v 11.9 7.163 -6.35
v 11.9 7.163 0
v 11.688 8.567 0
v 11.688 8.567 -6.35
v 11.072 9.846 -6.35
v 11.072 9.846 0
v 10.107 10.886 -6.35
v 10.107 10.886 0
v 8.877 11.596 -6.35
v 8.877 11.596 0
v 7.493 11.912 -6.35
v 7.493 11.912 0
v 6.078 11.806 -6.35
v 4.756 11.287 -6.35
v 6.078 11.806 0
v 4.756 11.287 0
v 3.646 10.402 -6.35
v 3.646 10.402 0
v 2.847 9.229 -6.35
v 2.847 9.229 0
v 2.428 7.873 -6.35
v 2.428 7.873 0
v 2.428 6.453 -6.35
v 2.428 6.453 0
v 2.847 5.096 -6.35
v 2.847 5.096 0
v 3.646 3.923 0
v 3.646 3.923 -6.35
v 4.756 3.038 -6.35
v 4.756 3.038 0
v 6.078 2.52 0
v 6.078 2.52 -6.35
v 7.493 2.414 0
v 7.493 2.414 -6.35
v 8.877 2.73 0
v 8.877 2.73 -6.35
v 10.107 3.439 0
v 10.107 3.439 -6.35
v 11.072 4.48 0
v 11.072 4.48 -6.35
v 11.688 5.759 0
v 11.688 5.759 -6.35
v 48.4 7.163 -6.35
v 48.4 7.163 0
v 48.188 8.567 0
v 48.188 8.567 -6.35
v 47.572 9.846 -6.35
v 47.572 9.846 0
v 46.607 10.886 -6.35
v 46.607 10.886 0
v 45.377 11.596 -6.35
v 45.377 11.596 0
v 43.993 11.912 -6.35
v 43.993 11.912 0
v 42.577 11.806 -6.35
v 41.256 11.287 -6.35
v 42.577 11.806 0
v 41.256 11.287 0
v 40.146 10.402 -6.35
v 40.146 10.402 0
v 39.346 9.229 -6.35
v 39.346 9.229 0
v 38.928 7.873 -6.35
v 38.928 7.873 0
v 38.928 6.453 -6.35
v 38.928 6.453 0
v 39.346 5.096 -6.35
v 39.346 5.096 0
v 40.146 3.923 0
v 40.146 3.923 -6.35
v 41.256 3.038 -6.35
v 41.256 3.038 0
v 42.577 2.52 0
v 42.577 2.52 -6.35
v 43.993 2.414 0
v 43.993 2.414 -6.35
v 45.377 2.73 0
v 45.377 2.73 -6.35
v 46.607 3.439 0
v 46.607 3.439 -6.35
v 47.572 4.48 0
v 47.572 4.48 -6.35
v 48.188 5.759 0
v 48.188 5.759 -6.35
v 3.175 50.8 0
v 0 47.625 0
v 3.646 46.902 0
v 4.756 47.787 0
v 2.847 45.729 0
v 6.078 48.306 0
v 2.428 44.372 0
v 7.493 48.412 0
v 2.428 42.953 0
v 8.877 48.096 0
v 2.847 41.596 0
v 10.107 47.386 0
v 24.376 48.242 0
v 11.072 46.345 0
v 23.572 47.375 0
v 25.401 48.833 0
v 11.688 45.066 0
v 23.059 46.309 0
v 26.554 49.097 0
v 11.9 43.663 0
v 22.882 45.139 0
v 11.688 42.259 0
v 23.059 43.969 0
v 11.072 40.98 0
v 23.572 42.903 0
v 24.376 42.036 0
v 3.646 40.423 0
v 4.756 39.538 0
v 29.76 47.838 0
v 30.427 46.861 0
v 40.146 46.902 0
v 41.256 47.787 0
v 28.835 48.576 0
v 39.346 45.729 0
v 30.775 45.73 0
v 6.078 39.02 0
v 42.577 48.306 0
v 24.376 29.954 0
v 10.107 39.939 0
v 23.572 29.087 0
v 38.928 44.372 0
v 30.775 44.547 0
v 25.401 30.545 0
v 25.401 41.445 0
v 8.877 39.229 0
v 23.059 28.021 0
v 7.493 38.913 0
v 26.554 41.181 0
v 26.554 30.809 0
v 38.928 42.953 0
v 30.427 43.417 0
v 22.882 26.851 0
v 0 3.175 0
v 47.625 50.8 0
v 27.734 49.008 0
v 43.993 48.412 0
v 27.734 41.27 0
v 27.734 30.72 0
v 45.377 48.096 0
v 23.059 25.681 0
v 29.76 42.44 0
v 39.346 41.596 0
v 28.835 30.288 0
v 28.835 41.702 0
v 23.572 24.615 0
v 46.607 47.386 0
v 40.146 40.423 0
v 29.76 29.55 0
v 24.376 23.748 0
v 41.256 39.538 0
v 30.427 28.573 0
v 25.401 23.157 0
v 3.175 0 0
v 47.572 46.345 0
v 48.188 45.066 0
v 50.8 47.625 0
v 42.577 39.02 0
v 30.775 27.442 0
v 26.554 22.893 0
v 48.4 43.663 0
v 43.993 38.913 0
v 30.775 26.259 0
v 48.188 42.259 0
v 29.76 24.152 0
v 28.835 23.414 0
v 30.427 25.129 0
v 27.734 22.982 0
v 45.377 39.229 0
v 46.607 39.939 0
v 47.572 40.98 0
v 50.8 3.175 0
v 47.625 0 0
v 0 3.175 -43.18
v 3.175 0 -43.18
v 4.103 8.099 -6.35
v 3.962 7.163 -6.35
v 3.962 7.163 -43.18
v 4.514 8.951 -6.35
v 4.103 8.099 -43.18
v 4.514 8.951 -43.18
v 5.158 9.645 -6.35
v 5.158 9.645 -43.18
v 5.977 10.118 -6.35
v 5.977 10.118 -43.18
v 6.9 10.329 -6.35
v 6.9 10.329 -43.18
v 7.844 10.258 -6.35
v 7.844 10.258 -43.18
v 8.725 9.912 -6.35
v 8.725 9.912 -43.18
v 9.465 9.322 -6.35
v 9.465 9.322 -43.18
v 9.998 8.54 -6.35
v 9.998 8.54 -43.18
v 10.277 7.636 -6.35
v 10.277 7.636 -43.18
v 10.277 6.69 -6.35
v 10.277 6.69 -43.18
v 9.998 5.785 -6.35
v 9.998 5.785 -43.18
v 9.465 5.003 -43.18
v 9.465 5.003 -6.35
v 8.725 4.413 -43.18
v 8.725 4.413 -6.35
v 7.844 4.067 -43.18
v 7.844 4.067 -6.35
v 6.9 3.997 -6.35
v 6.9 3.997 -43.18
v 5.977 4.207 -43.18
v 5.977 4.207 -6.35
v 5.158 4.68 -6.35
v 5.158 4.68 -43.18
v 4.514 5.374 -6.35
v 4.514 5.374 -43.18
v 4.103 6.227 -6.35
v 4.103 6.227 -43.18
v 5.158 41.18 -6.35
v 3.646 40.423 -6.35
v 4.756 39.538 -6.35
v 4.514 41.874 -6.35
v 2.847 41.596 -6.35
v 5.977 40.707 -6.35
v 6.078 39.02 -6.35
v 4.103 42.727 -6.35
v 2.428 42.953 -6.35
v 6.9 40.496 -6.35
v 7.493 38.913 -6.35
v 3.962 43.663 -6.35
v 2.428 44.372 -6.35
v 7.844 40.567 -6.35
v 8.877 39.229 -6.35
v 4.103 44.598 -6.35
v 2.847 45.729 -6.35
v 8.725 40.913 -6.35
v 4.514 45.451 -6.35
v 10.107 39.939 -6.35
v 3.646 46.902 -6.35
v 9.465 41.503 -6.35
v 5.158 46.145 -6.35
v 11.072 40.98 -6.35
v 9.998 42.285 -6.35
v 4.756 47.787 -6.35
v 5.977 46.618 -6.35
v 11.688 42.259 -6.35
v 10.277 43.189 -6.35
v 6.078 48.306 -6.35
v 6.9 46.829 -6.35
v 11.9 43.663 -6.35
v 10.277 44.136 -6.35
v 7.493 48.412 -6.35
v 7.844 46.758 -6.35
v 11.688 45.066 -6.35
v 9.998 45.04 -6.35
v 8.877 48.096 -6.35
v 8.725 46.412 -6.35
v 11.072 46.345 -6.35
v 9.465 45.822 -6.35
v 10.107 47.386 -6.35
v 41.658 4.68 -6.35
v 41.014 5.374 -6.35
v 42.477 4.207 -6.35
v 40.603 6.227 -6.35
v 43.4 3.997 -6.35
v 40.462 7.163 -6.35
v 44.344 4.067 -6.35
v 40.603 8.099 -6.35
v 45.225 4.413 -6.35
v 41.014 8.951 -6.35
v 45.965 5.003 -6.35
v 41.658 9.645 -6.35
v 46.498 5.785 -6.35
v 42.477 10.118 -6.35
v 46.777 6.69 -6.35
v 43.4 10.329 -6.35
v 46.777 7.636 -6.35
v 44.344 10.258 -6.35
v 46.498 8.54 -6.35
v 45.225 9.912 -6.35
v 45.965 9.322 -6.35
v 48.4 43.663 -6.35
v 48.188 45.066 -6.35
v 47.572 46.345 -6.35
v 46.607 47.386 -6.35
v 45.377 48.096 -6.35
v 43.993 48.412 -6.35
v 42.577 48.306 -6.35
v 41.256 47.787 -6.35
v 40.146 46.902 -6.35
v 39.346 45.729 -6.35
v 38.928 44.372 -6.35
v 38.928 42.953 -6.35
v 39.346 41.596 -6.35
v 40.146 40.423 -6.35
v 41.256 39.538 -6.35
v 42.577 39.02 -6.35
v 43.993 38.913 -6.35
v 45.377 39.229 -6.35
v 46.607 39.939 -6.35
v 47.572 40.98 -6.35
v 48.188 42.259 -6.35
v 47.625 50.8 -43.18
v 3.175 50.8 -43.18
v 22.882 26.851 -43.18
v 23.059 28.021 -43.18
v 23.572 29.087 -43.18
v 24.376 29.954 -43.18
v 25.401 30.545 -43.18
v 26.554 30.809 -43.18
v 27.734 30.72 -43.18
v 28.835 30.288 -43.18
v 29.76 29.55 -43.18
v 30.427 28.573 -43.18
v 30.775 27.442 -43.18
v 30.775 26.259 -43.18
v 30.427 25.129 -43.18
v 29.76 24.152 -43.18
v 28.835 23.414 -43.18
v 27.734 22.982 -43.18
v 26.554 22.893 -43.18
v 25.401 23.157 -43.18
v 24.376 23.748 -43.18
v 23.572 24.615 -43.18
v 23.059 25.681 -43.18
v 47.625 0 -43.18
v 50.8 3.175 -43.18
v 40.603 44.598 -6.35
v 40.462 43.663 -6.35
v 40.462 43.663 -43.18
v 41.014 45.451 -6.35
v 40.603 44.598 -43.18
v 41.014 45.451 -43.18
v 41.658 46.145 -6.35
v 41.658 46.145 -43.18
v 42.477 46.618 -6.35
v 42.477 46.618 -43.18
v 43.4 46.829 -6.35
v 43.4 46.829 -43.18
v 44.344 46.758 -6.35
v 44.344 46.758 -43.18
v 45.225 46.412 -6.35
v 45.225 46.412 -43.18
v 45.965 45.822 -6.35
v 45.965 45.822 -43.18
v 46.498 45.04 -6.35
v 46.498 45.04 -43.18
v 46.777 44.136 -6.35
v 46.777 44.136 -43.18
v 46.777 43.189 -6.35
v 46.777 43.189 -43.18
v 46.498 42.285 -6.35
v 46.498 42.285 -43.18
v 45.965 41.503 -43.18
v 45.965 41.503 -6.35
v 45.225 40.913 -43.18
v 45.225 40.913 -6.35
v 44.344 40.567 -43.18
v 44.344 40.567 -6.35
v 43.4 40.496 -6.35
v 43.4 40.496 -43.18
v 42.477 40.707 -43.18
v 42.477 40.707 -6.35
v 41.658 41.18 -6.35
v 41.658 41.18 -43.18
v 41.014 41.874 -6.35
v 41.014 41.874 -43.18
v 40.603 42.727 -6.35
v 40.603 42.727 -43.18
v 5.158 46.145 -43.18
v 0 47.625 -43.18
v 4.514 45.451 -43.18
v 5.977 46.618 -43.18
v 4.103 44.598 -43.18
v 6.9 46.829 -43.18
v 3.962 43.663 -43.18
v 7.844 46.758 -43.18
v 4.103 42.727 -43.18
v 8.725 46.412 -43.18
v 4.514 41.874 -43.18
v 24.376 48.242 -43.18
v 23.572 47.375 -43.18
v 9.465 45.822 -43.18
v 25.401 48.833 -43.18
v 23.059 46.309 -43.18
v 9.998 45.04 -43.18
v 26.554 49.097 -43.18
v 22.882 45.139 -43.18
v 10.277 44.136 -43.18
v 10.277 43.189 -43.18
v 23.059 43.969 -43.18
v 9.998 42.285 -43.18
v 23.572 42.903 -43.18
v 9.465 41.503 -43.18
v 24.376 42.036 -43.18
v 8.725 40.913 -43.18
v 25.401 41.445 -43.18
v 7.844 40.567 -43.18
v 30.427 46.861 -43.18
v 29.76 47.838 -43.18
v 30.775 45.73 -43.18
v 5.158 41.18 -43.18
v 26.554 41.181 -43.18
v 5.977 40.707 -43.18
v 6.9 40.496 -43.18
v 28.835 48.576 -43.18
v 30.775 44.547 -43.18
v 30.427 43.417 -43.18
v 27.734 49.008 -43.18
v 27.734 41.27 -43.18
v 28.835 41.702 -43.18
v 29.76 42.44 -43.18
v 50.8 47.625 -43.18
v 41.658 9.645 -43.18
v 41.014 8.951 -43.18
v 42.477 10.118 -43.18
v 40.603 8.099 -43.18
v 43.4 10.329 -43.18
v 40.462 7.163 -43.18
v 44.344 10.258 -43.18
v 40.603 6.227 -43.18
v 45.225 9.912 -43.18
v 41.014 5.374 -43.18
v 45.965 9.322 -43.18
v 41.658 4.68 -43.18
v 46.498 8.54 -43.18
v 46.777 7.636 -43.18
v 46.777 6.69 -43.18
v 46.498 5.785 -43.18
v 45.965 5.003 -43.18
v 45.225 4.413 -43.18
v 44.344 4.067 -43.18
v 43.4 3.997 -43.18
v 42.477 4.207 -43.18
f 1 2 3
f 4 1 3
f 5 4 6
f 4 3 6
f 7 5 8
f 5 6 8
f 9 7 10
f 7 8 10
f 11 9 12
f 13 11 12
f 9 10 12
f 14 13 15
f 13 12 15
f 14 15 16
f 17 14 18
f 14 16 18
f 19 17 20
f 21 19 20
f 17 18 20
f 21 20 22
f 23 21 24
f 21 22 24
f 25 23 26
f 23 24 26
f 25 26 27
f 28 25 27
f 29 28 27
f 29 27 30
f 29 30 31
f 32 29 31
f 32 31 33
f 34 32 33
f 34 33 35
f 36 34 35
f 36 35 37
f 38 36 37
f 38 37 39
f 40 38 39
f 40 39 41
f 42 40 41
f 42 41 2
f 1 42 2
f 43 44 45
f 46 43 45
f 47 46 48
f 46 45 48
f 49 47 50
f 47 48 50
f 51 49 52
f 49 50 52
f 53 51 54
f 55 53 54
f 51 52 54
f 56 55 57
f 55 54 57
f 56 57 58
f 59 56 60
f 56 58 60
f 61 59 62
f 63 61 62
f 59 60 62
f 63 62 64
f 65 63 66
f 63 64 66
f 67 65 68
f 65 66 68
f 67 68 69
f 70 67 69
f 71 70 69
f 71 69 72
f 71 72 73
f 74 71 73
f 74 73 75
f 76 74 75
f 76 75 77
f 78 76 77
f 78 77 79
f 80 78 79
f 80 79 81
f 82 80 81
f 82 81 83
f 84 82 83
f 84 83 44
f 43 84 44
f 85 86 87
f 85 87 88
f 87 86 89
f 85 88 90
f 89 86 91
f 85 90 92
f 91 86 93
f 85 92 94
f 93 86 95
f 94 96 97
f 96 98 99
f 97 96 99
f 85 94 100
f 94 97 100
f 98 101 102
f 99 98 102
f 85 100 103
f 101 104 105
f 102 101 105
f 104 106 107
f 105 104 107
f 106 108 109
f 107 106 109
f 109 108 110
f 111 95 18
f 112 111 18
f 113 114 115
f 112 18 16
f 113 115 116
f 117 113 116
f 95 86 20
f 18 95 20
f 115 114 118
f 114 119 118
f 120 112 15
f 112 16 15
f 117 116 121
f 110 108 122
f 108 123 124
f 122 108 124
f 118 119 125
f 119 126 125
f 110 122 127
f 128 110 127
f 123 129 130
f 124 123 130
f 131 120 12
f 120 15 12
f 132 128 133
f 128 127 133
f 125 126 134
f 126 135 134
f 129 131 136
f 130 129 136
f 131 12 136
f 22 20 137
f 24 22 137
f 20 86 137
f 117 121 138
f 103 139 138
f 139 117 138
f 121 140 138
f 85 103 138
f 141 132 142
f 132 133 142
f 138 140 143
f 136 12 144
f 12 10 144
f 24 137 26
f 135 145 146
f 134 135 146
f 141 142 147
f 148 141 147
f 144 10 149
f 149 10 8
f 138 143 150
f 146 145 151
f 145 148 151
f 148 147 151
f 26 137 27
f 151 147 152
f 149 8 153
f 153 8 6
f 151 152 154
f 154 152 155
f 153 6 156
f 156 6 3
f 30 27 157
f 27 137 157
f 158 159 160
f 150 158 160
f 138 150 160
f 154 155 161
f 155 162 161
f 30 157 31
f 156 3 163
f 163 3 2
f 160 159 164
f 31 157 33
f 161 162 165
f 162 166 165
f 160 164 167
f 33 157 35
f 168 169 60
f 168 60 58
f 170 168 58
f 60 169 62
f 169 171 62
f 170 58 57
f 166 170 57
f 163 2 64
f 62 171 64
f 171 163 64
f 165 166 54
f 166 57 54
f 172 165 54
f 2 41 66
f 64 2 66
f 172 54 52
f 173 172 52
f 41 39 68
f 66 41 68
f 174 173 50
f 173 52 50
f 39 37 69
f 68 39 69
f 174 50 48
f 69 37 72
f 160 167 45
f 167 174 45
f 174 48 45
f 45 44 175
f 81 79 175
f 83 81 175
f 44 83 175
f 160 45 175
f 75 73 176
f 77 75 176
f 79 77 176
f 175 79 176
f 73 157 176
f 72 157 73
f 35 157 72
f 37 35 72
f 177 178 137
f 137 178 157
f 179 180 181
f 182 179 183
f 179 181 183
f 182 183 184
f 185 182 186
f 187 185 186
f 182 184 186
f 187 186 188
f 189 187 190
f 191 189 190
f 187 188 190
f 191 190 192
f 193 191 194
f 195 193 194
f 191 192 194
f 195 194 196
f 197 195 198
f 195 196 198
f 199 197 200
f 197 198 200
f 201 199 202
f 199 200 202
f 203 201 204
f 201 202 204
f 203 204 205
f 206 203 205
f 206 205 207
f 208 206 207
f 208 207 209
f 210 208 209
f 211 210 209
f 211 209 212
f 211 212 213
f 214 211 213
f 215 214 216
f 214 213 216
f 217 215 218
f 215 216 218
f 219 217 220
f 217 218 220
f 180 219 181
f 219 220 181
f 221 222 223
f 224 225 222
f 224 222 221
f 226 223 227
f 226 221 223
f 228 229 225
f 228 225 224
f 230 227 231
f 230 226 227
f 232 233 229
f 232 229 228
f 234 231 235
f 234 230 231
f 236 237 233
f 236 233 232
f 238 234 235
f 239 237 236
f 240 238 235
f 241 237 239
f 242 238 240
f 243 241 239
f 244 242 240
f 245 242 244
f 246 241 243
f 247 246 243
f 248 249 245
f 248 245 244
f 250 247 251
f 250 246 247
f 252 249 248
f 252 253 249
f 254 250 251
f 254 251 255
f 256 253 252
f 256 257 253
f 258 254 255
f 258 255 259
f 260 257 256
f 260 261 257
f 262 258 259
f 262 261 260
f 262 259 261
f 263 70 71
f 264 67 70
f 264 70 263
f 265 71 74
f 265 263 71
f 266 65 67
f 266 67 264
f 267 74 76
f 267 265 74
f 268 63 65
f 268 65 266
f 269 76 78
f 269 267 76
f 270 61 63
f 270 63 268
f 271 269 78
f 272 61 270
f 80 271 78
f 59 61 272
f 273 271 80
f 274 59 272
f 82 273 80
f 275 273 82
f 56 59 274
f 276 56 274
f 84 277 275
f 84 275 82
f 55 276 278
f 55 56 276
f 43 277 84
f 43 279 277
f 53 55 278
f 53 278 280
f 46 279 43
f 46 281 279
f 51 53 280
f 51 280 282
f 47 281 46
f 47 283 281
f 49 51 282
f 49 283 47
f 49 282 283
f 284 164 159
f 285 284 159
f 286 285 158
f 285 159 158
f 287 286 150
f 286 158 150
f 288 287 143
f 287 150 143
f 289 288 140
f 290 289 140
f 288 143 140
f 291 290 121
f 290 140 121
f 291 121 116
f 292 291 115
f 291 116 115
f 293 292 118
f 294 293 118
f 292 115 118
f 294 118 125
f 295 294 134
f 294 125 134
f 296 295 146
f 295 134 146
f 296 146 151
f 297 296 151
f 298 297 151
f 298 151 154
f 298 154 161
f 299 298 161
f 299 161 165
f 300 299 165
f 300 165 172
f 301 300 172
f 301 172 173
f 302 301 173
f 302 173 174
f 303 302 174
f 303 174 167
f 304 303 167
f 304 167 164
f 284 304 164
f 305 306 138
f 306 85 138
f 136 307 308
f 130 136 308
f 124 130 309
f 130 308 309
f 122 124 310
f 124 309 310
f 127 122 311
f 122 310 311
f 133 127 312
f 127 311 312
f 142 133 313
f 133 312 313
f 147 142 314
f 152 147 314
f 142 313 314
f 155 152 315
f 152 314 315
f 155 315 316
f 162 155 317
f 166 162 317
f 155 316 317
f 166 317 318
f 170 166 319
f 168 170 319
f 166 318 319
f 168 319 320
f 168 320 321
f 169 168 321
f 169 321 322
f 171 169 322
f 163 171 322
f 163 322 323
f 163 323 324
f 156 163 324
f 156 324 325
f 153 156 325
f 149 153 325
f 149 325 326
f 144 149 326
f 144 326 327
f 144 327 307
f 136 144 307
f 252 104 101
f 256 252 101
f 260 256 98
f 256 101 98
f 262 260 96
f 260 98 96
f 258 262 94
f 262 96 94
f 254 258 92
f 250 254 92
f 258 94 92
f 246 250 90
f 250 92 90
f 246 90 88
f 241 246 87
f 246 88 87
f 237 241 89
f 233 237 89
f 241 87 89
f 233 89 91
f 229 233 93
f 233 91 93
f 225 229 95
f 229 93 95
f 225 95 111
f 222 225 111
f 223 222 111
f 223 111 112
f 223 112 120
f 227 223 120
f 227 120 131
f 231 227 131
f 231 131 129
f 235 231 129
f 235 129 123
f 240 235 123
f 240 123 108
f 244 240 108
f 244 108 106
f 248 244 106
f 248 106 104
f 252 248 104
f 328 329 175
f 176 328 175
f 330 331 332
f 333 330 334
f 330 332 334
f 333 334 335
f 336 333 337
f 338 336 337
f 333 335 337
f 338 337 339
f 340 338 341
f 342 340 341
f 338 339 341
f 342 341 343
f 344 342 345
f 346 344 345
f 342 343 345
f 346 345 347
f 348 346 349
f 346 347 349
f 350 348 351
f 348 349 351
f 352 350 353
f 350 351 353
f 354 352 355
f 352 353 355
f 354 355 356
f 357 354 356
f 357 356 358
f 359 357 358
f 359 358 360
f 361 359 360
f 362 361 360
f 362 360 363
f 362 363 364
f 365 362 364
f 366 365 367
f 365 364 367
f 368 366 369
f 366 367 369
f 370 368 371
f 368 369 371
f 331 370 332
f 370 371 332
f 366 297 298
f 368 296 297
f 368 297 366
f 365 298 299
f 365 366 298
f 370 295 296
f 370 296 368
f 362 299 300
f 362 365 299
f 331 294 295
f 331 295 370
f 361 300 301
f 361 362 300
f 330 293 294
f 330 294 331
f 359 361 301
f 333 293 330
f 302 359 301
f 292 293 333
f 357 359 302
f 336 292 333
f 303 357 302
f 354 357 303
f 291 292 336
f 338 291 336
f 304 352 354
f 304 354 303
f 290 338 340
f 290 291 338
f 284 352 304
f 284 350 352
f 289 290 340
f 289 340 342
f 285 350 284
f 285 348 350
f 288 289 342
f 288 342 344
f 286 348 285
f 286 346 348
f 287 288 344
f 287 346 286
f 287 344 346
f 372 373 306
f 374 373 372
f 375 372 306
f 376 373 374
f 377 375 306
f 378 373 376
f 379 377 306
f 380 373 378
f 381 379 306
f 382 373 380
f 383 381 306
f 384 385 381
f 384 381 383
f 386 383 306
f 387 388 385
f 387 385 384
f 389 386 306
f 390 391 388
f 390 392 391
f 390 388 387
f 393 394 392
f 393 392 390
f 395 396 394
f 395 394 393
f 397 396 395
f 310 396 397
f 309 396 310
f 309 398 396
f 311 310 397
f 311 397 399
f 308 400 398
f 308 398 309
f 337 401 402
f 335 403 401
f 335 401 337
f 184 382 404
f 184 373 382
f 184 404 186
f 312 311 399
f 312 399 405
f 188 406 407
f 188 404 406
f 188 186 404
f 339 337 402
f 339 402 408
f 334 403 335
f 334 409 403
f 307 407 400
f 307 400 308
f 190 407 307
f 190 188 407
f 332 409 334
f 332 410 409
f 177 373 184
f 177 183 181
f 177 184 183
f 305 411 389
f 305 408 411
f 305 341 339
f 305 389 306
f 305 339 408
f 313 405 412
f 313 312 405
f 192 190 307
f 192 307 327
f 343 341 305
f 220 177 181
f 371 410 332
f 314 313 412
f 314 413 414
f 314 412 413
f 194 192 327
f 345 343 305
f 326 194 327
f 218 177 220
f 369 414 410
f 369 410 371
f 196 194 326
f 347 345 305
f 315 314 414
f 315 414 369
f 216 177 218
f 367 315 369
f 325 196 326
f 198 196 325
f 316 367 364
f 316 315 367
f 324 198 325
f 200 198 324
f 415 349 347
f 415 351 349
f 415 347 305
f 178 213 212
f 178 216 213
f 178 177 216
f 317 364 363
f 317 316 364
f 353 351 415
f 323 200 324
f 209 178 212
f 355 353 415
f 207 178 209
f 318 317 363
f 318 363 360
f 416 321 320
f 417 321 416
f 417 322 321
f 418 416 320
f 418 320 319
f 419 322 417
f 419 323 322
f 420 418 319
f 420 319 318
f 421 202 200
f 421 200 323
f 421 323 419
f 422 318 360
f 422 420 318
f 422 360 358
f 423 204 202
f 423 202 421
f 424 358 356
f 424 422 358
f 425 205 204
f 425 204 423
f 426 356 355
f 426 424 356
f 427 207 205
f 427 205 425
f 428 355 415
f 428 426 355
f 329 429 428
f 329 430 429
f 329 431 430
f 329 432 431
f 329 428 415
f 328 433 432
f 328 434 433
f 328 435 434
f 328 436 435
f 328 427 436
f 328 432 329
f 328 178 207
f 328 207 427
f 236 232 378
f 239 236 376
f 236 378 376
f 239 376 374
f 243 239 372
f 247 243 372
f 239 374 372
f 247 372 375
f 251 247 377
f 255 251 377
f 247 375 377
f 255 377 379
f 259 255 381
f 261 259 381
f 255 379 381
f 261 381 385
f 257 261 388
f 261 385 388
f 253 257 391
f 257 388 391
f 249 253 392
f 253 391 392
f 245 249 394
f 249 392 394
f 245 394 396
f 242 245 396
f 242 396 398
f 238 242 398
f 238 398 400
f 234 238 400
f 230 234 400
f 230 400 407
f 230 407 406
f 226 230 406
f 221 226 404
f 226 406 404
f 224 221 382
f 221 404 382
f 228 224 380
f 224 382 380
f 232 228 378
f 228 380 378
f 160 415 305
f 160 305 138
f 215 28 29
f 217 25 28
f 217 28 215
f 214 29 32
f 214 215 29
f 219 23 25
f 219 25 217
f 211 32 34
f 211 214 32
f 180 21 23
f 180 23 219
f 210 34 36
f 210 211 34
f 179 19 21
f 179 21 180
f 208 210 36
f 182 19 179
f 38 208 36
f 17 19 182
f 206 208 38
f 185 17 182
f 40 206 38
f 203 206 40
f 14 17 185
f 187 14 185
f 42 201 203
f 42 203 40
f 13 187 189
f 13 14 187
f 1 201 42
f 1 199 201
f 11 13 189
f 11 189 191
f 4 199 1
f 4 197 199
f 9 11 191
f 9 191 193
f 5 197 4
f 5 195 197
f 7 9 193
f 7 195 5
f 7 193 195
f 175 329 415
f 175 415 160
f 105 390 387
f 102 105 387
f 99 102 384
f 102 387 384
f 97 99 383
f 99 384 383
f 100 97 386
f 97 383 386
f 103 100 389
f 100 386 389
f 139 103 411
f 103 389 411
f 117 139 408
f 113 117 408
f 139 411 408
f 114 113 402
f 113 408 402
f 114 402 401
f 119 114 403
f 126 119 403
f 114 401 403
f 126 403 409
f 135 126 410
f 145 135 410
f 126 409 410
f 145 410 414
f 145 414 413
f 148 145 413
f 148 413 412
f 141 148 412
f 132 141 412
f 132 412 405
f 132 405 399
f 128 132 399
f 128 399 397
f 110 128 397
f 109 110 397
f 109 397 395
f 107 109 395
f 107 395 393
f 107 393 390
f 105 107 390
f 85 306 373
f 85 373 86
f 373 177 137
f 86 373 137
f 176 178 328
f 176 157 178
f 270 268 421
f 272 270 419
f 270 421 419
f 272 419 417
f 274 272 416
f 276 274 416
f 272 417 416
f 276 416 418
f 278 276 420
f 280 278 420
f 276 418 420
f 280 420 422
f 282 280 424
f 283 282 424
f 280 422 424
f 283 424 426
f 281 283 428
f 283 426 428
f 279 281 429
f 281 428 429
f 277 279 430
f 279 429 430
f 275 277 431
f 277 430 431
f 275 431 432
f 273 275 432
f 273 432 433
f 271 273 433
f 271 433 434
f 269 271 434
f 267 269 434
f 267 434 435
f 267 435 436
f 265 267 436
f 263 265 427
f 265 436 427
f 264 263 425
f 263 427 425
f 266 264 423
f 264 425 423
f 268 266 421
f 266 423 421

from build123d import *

# Parameters (mm, degrees)
F0_W           = 50.8
F0_H           = 43.18
F1_DEPTH       = 50.8
F3_D           = 6.35
F3_CBORE_D     = 9.525
F3_CBORE_DEPTH = 6.35
F5_D           = 7.9375
F6_SIZE        = 3.175


with BuildPart() as f1:
    # F0 (on Front) → F1 (new body)
    with BuildSketch(Plane.XZ):
        with Locations((25.4, -21.59)):
            Rectangle(F0_W, F0_H)
    extrude(amount=-F1_DEPTH)

    # F3 (through all)
    with Locations(Plane.XY):
        with Locations((7.1374, 7.1628), (7.1374, 43.6626), (43.6372, 43.6626), (43.6372, 7.1628)):
            CounterBoreHole(F3_D / 2, F3_CBORE_D / 2, F3_CBORE_DEPTH)

    # F5 (through all)
    with Locations(Plane.XY):
        with Locations((26.850944, 26.850944), (26.850944, 45.138944)):
            Hole(F5_D / 2)

    # F6
    f6_edges = [f1.edges().sort_by_distance(p)[0] for p in [
        (50.8, 50.8, -21.59),
        (50.8, 0, -21.59),
        (0, 50.8, -21.59),
        (0, 0, -21.59),
    ]]
    chamfer(f6_edges, length=F6_SIZE)


solid = f1.part
